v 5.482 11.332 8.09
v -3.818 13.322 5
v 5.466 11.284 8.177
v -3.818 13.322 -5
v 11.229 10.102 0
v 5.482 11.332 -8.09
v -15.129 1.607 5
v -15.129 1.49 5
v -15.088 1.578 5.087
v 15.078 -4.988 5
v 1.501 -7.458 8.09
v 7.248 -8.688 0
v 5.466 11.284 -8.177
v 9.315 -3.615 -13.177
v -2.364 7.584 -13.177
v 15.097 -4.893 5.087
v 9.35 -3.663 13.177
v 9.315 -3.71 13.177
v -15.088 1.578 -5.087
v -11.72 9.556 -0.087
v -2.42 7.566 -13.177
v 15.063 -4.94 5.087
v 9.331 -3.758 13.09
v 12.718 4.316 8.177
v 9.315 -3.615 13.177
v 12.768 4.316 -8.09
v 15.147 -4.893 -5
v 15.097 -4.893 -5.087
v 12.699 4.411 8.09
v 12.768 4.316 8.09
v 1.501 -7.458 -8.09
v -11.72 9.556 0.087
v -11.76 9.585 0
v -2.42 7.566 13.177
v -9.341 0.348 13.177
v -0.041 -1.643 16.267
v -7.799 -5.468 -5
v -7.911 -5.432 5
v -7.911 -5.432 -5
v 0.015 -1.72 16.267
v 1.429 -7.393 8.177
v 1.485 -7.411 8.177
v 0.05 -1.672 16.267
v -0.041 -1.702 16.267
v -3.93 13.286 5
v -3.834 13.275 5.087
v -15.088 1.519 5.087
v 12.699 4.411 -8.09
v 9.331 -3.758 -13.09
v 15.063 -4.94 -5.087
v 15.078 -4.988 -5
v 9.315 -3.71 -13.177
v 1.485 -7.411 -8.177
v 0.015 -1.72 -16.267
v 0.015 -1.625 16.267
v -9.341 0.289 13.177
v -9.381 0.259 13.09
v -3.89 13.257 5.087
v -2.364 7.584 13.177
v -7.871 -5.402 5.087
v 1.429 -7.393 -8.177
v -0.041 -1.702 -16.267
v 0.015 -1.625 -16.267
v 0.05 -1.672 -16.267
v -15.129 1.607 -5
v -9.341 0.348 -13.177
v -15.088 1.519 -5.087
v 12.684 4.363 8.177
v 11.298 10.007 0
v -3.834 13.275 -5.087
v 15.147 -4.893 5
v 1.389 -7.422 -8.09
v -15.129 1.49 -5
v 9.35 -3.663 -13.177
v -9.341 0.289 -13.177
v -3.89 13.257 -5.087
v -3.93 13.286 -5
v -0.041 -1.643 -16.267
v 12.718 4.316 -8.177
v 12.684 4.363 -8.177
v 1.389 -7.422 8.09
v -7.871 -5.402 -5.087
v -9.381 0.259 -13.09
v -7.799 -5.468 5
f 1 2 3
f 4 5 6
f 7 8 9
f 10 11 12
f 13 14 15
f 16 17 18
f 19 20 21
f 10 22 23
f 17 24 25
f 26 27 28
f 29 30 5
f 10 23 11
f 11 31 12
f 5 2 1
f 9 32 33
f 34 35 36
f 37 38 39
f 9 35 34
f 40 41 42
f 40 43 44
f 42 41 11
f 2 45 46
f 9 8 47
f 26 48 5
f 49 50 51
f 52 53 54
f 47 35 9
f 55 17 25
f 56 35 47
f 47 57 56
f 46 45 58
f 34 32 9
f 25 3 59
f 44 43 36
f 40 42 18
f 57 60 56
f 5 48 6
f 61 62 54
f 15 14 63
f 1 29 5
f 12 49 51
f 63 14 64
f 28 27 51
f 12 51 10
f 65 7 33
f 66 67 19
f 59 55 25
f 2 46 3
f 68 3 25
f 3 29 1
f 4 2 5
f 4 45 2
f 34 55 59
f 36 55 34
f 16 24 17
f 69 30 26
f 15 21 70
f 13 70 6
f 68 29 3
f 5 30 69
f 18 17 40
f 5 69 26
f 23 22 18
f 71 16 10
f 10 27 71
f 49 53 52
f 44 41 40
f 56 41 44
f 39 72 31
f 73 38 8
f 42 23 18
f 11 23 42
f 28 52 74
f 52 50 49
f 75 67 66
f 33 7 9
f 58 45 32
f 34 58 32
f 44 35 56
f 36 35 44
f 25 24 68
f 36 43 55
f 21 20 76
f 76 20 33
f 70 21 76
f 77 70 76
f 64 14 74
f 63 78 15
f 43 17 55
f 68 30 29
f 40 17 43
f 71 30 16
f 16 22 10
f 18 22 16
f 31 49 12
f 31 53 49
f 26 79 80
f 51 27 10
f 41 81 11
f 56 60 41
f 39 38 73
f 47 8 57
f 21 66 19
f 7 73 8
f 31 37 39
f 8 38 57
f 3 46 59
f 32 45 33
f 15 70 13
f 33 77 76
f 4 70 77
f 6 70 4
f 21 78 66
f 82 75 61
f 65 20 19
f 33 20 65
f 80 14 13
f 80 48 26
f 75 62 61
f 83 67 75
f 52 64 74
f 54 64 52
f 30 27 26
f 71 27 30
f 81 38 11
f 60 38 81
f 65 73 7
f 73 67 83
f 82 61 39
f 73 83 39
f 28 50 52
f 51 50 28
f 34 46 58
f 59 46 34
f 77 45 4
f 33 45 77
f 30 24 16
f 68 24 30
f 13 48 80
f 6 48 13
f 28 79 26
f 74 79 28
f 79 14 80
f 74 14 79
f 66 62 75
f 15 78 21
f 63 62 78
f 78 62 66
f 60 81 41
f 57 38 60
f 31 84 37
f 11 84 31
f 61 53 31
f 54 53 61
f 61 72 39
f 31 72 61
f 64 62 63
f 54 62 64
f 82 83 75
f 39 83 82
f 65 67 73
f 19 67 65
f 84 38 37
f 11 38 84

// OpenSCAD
// Auto-generated OpenSCAD file

    inner_points = 10*[[0.9299608274506113, -0.36625251042878015, 1.3090169944285586], [-0.9300308766981566, 0.03182392530465242, -1.3090169944285586], [1.266848278790813, 0.4315612808941218, -0.8090169942043599], [-0.38493553047389745, 1.3227137557713289, 0.5000000001356605], [-3.5024755881594054e-05, -0.16721429274351698, 1.618033988749895], [-1.5047999228086544, 0.15483630882503643, -0.5000000000867447], [1.5047298735611092, -0.48926489394916417, 0.5000000000867447], [-3.502449166371223e-05, -0.16721429238061072, -1.618033988749895], [1.2668482786587043, 0.43156128071266875, 0.809016994545535], [-0.2379166193940685, 0.753611882281222, -1.3090169942911047], [-0.9300308769119134, 0.03182392501105499, 1.3090169943213361], [-1.504799922890302, 0.15483630871289225, 0.4999999999132554], [1.5047298736427568, -0.48926489383702, -0.4999999999132554], [0.929960827664368, -0.3662525101351827, -1.3090169943213361], [1.1198293677926323, 1.0006631544963729, 2.224050943411271e-10], [0.5450603218142434, 1.12367553819821, -0.8090169941856757], [-0.23791661960782534, 0.7536118819876247, 1.3090169944587902], [-1.1679124716822094, 0.952650099854341, 3.023159500514794e-11], [0.5450603216821343, 1.123675538016757, 0.8090169945642192], [-0.38493553039224954, 1.3227137558834732, -0.4999999998643395], [-0.7830119659137325, -0.5372779485911959, 0.4999999998945711], [0.1469838862422994, -0.7363161663457679, 0.8090169943231298], [-0.7830119658320847, -0.5372779484790517, -0.500000000105429], [0.7217529323527971, -0.859328549866152, -1.86841930815973e-11], [0.14698388637440846, -0.7363161661643148, -0.8090169944267651]];

    outer_points = 10*[[0.0003389073222320645, 1.6180338602780315, 0.0005485303033235351], [-0.0003389073222320645, -1.6180338602780315, -0.0005485303033235351], [-1.376497554636943, 0.0, 0.8504636798996249], [0.8504636123728273, -0.0006447818753087883, 1.376497445343067], [0.9513306684223868, 1.3088176418818913, 0.0005730337122140106], [0.950782304855979, -1.309216138996162, -0.0003145069624228003], [-0.950782304855979, 1.309216138996162, 0.0003145069624228003], [-0.9513306684223868, -1.3088176418818913, -0.0005730337122140106], [-0.4251668862145562, 1.3088176418818913, 0.8510367136118389], [-0.42571524978096387, -1.309216138996162, 0.8501491729372022], [1.538946448725346, 0.4996775693623565, 0.00037865771973821793], [1.5387369924811702, -0.5003223512376653, 3.964734842487605e-05], [-1.5387369924811702, 0.5003223512376653, -3.964734842487605e-05], [-1.538946448725346, -0.4996775693623565, -0.00037865771973821793], [-0.688273380108343, 0.4996775693623565, 1.3764577979946422], [-0.6884828363525187, -0.5003223512376653, 1.3761187876233287], [1.1135701062666141, 0.808495290644226, 0.8510763609602638], [1.1132311989443822, -0.8095385696338055, 0.8505278306569404], [0.2628478320698681, 0.808495290644226, 1.3766918213355428], [0.26250892474763604, -0.8095385696338055, 1.3761432910322193], [0.8507222741967461, 0.0, -0.525615460375279], [0.2631064938937868, 0.8091400725195348, -0.5254210843828031], [0.26276758657155475, -0.8088937877584967, -0.5259696146861268], [-0.6880147182844242, 0.5003223512376653, -0.5256551077237038], [-0.6882241745285999, -0.4996775693623565, -0.5259941180950172]];

    // Convex hull for inner set (I)
    module inner_hull() {
        hull() {
            for (p = inner_points) {
                translate(p) sphere(r=0.1);
            }
        }
    }

    // Convex hull for outer set (O) minus inner hull (O \ I)
    module outer_minus_inner() {
        difference() {
            hull() {
                for (p = outer_points) {
                    translate(p) sphere(r=0.1);
                }
            }
            inner_hull(); // Subtract inner hull
        }
    }

    // Convex hull for outer set (O) minus all translated inner hulls
    module outer_minus_AllTranslationInner() {
        difference() {
            hull() {
                for (p = outer_points) {
                    translate(p) sphere(r=0.1);
                }
            }
            hull() {
                translate([0,0,50]) inner_hull();
                translate([0,0,-50]) inner_hull();
            }; // Subtract translated inner hulls
        }
    }

    // Difference between outer_minus_inner and outer_minus_AllTranslationInner
    module outer_minus_inner_diff() {
        difference() {
            // Outer minus inner
            difference() {
                hull() {
                    for (p = outer_points) {
                        translate(p) sphere(r=0.1);
                    }
                }
                inner_hull();
            }

            // Subtract Outer minus AllTranslationInner
            difference() {
                hull() {
                    for (p = outer_points) {
                        translate(p) sphere(r=0.1);
                    }
                }
                hull() {
                    translate([0,0,50]) inner_hull();
                    translate([0,0,-50]) inner_hull();
                };
            }
        }
    }

    // Rendering all with colors applied
    color([1, 0, 0, 0.5]) inner_hull(); // Transparent red
    
